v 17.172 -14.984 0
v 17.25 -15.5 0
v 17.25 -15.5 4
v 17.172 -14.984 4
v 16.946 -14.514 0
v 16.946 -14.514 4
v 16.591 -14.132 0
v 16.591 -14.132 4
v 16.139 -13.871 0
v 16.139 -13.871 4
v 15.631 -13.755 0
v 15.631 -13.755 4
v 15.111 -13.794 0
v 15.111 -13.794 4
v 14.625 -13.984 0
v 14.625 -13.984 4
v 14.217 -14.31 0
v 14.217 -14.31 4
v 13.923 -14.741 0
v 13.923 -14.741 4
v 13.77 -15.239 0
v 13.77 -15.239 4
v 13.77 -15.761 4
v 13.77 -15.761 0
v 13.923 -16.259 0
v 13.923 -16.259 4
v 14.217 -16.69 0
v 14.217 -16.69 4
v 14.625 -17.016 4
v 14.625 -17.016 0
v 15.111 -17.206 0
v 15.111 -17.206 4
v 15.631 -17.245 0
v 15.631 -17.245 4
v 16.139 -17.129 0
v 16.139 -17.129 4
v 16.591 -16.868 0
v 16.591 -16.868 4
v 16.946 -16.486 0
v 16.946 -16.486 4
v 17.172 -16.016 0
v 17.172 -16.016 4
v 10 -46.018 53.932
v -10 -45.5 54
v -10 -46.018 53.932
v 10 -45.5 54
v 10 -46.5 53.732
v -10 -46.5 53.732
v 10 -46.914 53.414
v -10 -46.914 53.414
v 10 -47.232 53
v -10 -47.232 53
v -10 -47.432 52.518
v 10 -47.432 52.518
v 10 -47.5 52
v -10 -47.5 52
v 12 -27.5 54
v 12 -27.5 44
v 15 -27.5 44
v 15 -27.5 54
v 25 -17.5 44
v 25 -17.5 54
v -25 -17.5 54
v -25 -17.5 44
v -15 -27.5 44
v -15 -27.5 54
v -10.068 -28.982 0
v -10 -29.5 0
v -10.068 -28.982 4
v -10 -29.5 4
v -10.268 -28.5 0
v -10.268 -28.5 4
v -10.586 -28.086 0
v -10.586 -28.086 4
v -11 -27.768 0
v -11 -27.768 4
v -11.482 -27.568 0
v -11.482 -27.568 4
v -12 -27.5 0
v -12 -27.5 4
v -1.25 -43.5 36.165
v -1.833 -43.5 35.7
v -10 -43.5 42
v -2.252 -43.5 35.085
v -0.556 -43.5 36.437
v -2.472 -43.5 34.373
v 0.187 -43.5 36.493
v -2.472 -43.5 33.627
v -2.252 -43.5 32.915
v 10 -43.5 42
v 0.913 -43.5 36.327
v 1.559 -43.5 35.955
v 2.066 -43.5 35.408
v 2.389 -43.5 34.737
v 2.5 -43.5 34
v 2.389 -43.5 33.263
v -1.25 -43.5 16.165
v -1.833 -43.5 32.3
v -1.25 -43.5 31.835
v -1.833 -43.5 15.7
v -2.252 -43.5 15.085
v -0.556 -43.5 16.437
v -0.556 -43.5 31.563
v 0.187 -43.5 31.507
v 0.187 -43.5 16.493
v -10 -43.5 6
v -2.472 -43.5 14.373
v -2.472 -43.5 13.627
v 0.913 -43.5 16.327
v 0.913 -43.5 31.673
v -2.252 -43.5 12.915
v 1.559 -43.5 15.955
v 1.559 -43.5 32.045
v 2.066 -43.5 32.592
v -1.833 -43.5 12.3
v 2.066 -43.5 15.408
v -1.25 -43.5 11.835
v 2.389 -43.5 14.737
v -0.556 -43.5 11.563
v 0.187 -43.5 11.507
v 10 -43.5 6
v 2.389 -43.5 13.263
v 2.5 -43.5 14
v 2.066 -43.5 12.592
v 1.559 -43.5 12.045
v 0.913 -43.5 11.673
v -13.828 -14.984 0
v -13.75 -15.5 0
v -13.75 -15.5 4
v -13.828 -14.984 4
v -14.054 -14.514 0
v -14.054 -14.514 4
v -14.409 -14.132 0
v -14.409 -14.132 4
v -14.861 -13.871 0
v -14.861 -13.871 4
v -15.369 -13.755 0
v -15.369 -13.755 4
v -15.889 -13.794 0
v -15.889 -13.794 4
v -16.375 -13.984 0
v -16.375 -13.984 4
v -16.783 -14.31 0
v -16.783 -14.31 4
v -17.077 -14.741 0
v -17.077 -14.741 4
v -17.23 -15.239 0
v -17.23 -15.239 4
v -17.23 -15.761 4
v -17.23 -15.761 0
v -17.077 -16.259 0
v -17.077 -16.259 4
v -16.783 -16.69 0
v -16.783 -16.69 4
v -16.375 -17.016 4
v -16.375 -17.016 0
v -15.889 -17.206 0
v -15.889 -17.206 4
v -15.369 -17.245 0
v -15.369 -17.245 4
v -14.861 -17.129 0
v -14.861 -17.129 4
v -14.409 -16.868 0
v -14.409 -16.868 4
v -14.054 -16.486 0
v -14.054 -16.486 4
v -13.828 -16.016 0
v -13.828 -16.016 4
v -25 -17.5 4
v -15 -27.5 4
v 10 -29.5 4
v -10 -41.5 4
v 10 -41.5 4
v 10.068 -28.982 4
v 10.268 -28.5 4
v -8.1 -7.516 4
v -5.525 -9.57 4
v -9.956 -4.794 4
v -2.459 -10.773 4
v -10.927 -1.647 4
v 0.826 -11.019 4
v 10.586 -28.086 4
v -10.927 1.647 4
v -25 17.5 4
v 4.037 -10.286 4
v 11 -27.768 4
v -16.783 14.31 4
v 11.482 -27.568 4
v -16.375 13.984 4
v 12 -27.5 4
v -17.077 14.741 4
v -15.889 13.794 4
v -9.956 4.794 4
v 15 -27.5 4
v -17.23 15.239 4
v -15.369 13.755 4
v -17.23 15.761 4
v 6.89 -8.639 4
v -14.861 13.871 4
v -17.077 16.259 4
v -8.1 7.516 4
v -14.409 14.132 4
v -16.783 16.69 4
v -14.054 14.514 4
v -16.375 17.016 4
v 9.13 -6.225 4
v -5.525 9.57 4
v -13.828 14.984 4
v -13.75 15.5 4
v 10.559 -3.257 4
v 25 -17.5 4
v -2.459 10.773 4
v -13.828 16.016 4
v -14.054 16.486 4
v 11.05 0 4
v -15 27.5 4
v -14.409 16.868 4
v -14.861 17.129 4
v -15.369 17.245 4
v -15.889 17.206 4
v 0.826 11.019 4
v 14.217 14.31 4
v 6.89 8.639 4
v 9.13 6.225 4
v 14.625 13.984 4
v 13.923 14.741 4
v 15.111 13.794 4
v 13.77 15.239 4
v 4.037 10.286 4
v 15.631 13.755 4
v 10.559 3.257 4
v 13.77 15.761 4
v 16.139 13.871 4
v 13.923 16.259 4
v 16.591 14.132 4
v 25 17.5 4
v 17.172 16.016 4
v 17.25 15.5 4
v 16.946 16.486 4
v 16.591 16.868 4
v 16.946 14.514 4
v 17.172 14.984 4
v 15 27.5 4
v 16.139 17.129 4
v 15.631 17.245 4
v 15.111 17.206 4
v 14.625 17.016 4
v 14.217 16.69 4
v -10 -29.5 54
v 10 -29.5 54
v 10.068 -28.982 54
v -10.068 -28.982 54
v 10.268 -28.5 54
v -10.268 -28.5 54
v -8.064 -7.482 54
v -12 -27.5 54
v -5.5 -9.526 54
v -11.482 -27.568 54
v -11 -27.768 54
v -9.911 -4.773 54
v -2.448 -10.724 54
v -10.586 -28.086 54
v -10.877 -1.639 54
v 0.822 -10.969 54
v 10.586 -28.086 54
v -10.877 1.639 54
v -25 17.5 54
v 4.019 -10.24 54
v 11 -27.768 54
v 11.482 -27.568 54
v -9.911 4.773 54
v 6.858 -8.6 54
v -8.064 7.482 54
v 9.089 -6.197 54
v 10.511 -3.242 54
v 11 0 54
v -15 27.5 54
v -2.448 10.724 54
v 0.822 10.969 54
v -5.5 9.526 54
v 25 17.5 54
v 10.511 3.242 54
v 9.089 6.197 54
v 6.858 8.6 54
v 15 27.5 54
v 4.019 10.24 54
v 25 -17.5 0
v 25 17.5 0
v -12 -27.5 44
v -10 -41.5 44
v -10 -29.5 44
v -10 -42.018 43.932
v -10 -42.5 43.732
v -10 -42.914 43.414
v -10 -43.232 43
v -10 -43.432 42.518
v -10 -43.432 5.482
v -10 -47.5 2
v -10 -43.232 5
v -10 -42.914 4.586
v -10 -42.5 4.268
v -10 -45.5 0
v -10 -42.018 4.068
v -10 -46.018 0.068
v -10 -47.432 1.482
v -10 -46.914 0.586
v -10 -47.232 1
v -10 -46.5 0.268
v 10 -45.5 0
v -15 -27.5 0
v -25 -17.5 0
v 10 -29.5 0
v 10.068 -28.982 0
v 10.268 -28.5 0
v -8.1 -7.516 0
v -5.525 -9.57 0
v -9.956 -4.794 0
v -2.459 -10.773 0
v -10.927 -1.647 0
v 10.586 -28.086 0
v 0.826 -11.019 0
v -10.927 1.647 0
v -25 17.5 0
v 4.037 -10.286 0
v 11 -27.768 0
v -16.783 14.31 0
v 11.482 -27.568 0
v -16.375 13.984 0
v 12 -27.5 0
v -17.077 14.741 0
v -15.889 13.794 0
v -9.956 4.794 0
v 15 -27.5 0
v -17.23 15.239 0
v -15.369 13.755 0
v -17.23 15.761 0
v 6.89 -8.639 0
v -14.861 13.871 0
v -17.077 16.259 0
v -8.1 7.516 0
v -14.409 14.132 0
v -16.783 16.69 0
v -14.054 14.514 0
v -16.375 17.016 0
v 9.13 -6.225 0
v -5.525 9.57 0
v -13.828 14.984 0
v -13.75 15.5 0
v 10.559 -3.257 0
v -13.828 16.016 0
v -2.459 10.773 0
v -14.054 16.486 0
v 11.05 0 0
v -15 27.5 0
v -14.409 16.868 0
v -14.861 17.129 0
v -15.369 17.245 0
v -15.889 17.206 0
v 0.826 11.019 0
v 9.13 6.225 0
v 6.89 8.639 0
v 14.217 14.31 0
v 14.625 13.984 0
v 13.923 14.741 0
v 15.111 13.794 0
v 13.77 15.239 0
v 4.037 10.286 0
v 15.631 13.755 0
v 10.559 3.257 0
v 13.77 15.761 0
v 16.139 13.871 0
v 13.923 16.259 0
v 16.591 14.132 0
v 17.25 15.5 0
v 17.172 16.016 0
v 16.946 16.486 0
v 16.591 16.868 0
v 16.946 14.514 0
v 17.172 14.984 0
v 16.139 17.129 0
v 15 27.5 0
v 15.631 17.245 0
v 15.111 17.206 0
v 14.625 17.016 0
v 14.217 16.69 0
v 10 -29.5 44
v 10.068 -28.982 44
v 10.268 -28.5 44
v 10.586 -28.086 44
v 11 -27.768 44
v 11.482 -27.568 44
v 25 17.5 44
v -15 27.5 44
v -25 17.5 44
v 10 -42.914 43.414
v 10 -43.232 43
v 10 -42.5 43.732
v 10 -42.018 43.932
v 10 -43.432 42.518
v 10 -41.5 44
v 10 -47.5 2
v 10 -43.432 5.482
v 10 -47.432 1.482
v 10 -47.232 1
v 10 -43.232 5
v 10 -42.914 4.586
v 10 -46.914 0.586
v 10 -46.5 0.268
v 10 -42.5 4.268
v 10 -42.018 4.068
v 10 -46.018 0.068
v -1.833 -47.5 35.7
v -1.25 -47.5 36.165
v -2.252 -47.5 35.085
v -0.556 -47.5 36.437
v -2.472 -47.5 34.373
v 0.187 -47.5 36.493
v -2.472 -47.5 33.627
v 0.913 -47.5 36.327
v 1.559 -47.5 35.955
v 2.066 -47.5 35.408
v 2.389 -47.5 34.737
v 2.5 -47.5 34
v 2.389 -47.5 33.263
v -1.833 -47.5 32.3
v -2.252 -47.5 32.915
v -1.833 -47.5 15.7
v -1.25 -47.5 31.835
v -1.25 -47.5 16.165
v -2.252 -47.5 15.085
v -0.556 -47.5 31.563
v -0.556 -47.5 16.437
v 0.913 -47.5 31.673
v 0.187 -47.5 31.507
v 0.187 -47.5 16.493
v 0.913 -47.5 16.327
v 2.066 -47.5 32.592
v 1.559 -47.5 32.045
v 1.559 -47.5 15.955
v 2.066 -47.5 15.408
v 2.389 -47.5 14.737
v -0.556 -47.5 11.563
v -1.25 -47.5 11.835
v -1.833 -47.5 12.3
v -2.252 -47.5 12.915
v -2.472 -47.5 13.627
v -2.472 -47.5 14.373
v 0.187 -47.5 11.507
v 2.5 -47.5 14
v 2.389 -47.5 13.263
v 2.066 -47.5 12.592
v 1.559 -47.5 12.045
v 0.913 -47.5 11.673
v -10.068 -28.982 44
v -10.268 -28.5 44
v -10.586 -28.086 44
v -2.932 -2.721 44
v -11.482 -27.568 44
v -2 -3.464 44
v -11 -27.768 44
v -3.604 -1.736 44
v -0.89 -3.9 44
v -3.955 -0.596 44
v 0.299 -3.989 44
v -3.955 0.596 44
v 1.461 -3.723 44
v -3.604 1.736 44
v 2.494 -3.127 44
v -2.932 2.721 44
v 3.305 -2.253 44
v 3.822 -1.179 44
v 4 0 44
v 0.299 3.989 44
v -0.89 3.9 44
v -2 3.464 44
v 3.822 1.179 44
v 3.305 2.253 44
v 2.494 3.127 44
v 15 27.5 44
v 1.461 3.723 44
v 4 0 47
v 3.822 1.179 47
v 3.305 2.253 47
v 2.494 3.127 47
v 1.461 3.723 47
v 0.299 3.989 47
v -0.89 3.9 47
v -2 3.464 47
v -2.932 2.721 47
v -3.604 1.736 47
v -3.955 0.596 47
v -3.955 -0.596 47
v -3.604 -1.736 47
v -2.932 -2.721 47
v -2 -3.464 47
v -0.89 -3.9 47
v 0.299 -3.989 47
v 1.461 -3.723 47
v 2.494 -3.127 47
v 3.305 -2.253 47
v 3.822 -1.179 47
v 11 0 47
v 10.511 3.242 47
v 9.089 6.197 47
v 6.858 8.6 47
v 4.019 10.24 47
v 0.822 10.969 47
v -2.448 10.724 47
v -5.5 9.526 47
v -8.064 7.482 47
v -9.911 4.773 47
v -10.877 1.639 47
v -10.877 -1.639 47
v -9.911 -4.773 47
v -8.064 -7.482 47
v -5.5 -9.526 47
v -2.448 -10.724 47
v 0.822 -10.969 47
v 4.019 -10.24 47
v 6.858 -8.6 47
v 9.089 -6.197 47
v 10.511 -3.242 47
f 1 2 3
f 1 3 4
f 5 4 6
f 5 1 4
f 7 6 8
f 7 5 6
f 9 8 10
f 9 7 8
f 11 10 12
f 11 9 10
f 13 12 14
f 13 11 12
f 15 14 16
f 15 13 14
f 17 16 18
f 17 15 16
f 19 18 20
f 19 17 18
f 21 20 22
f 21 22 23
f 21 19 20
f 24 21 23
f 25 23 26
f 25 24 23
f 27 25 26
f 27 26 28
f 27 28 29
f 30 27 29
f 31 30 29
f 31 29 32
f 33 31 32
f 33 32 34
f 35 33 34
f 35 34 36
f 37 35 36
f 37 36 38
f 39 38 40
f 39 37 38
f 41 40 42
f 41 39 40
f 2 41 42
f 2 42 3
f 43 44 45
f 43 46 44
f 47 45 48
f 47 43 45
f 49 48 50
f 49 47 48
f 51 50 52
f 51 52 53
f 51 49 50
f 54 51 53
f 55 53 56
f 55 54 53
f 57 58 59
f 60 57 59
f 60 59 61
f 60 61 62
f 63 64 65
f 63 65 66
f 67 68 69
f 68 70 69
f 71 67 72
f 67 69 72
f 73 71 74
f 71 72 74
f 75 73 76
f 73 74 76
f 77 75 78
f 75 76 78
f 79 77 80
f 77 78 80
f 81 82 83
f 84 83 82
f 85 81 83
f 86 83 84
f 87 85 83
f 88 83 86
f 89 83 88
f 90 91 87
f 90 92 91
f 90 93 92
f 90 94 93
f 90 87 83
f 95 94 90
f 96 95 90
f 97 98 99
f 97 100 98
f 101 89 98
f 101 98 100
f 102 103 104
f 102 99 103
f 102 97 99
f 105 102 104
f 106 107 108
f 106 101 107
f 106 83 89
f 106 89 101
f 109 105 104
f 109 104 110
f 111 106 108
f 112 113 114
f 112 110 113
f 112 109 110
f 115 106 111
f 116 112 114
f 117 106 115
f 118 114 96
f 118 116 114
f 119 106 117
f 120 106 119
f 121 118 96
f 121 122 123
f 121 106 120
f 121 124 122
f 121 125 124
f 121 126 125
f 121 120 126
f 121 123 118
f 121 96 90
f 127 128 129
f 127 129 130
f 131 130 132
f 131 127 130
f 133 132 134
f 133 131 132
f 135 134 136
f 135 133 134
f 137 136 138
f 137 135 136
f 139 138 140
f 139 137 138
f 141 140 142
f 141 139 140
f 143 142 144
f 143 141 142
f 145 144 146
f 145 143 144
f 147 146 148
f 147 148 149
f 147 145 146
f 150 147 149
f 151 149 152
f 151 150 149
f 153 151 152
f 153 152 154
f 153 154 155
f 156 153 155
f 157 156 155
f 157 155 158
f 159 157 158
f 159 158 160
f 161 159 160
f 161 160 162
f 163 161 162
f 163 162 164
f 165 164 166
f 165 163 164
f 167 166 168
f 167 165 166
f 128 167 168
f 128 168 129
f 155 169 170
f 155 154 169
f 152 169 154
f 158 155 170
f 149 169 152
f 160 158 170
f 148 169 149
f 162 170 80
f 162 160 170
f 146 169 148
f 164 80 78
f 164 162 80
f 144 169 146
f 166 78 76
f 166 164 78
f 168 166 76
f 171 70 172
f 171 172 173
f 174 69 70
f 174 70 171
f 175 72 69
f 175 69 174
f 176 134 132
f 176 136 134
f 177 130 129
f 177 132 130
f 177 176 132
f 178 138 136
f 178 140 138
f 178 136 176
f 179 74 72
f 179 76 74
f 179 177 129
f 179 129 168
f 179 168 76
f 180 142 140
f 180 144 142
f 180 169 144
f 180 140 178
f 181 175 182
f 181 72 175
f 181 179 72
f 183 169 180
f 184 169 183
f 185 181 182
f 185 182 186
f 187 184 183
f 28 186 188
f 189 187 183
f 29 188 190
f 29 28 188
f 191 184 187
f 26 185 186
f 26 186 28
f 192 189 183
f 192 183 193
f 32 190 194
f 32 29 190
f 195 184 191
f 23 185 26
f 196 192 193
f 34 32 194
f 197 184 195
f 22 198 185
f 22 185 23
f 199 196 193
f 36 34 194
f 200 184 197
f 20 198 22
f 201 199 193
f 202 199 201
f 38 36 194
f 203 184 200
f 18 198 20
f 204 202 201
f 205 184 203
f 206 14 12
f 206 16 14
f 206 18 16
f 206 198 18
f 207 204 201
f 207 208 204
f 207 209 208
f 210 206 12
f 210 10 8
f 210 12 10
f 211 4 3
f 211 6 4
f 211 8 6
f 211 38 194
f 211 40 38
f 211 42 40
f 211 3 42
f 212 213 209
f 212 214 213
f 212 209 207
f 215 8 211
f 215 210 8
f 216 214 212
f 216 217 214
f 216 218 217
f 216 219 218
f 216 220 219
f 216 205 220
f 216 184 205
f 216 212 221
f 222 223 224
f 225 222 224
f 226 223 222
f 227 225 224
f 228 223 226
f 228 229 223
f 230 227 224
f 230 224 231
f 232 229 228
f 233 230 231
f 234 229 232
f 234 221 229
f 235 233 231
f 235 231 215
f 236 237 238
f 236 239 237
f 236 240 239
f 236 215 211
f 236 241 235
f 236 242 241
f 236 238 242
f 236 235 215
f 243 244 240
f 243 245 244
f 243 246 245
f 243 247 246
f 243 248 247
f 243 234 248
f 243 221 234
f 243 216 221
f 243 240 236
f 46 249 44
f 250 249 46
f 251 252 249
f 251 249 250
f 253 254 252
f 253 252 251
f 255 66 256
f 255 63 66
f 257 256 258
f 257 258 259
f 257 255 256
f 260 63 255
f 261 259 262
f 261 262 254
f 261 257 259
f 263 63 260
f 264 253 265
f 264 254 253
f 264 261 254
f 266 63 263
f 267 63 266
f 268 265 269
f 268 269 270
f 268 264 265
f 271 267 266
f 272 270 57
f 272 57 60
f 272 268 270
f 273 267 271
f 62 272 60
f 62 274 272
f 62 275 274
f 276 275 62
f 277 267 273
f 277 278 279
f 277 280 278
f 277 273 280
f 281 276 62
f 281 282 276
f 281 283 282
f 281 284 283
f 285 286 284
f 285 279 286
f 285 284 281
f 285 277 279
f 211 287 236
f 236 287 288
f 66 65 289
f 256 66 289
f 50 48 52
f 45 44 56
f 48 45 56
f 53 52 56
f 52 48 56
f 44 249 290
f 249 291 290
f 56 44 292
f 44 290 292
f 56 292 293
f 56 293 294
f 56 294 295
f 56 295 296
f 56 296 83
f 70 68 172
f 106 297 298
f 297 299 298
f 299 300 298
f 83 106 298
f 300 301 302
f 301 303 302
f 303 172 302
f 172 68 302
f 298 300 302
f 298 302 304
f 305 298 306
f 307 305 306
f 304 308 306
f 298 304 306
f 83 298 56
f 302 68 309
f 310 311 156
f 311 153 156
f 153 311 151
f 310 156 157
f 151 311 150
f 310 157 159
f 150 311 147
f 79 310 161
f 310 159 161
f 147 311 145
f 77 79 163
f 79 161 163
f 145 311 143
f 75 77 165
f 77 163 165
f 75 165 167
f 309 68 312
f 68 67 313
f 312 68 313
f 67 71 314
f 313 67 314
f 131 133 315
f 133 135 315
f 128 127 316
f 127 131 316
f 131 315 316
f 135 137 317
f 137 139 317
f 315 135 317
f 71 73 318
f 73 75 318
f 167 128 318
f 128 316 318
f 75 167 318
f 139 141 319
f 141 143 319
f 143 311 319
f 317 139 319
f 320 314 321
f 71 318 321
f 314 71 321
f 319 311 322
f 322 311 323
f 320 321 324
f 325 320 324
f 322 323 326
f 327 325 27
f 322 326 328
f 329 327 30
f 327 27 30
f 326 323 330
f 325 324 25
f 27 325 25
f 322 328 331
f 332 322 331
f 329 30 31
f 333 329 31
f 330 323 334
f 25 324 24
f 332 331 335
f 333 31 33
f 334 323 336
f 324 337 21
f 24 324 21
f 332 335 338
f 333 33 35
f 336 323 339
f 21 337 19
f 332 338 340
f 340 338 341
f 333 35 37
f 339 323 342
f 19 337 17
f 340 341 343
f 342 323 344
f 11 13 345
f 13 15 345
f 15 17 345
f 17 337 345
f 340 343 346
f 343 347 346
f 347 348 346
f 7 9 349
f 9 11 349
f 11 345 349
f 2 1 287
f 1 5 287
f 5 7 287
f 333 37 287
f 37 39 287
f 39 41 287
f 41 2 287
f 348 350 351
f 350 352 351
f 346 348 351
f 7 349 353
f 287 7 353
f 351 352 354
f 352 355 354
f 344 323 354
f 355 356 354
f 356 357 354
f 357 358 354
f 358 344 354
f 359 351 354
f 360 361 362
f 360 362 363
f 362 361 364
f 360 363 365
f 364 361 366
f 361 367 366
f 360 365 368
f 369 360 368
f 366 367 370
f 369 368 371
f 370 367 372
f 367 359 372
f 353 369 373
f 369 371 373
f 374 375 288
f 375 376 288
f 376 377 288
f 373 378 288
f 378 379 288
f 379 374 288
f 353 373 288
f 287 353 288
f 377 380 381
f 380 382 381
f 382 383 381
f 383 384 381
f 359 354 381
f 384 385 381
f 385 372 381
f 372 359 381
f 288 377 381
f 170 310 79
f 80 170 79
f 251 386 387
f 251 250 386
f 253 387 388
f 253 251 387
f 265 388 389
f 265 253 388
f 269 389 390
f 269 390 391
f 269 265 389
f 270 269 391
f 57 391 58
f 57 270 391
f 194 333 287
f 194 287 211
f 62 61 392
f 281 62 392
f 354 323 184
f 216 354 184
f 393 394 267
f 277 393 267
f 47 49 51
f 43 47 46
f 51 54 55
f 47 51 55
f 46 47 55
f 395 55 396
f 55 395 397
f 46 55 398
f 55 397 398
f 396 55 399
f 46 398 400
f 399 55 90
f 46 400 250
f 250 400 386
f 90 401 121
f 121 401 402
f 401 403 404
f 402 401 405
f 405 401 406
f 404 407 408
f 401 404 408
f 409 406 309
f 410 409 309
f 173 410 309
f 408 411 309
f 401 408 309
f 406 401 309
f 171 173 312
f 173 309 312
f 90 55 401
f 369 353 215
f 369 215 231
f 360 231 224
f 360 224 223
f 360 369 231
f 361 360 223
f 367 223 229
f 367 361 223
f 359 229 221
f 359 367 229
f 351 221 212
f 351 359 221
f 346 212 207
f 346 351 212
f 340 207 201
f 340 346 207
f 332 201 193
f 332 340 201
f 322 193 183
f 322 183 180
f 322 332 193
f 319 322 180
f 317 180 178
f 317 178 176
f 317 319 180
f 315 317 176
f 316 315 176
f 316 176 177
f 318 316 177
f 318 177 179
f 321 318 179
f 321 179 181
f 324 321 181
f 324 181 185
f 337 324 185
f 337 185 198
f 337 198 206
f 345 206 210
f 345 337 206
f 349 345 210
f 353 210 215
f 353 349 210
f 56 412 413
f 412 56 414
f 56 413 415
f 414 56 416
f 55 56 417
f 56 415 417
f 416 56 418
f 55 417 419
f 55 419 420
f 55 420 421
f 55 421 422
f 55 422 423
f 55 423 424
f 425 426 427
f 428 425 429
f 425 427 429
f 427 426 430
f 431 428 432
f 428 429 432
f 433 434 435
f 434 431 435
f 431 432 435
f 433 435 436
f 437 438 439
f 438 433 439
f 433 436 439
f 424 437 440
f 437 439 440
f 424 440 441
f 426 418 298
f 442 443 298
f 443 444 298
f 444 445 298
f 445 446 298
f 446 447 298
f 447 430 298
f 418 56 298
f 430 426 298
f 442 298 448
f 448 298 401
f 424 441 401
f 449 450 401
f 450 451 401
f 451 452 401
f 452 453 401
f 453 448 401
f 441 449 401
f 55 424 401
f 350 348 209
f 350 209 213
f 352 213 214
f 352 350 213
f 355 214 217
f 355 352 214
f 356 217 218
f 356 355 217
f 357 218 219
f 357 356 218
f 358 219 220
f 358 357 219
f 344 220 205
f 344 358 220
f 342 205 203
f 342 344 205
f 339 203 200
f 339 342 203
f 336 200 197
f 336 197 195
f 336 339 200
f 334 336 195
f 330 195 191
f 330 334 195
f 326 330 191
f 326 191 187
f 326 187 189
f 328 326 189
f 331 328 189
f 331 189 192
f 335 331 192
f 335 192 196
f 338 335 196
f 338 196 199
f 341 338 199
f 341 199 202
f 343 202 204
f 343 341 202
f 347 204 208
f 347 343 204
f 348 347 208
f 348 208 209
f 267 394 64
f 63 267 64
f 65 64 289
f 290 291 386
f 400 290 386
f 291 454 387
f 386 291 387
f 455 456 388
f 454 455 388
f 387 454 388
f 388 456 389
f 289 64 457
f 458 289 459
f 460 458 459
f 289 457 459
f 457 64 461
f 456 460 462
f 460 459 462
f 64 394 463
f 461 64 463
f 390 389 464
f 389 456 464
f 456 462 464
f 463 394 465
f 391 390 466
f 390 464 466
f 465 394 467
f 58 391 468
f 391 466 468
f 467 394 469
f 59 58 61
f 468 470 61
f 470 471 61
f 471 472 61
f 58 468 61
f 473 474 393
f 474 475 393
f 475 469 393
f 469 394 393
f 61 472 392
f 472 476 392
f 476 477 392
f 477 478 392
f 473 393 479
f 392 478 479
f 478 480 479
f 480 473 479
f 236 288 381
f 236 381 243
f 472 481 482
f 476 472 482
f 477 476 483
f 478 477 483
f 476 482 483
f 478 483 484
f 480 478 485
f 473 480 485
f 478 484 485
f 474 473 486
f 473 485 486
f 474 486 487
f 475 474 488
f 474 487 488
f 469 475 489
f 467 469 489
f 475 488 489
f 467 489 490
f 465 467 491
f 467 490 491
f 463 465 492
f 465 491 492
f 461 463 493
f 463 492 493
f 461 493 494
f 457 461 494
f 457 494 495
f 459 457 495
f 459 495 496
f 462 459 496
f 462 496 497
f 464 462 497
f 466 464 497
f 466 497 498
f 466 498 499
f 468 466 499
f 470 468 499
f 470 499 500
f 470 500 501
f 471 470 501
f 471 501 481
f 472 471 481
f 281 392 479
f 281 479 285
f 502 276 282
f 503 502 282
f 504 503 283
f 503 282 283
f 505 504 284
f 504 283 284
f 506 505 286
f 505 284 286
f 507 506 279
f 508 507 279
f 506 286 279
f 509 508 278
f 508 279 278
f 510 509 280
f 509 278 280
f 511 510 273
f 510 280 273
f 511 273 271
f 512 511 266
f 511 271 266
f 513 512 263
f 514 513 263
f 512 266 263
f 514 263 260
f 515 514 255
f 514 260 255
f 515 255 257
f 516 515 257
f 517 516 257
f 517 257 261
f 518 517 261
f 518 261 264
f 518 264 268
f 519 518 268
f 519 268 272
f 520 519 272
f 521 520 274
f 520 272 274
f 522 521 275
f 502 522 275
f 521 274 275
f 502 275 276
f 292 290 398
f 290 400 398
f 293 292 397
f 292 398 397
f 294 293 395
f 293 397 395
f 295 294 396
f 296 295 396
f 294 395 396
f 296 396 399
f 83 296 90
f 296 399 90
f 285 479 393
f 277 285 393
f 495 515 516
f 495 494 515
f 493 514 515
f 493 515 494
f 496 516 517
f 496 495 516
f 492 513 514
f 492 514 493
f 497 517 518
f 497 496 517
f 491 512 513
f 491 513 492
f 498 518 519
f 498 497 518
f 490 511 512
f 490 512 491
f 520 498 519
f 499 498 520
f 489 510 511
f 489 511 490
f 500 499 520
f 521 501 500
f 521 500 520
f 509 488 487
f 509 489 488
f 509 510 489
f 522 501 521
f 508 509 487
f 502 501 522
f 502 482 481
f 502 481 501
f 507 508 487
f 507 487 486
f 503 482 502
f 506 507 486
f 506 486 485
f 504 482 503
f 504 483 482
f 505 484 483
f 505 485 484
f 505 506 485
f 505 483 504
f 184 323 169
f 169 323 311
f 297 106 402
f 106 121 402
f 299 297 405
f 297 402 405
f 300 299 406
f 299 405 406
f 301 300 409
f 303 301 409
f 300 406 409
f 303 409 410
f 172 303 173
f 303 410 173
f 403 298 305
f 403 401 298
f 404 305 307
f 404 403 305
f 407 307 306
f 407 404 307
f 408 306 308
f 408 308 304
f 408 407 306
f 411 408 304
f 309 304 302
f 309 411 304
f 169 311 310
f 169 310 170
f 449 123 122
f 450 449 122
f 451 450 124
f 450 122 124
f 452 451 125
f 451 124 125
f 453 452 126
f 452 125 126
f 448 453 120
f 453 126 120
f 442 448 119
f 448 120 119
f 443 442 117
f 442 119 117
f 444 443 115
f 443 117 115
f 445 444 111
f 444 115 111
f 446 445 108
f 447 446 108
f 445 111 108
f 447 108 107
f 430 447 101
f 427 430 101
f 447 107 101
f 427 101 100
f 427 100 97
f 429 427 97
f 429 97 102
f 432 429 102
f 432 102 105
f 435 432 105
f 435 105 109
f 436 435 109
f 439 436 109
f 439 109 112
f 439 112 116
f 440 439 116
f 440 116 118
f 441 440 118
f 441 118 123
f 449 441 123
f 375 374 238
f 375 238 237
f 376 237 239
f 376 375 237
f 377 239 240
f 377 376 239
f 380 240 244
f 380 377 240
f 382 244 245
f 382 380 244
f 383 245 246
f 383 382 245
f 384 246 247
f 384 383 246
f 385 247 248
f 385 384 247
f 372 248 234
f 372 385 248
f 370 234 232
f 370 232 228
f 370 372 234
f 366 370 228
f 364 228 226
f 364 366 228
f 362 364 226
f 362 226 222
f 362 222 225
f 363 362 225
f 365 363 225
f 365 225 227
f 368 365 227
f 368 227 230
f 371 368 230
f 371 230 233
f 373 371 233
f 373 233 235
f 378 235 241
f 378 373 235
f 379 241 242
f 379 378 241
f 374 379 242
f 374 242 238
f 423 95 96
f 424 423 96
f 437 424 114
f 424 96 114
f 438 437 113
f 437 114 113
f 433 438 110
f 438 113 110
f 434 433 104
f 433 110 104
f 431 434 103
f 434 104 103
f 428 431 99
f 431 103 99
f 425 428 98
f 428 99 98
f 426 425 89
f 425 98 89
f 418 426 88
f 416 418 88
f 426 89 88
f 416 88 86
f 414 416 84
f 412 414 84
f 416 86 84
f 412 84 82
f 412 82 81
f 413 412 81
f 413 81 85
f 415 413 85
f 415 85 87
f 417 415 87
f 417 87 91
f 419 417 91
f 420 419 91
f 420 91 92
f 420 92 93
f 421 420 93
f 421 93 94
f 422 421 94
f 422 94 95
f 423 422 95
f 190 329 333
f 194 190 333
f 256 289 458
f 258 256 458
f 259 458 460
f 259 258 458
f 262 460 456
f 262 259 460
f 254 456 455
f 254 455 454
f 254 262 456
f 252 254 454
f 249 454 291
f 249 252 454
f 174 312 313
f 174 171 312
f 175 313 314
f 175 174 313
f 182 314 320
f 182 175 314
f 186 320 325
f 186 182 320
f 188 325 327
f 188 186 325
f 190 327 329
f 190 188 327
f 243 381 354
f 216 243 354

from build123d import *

# Parameters (mm, degrees)
SCHIZZO1_R                   = 1.75
SCHIZZO1_R_2                 = 11.05
ESTRUSIONE_ESTRUSIONE1_DEPTH = 4
SCHIZZO14_W                  = 20
SCHIZZO14_H                  = 4
ESTRUSIONE_ESTRUSIONE2_DEPTH = 40
ESTRUSIONE_ESTRUSIONE3_DEPTH = 10
SCHIZZO19_R                  = 11
TAGLIO_ESTRUSIONE1_DEPTH     = 7
SCHIZZO20_R                  = 4
TAGLIO_ESTRUSIONE2_DEPTH     = 7
SMUSSO1_SIZE                 = 10
RACCORDO1_R                  = 2
SCHIZZO21_R                  = 2.5
TAGLIO_ESTRUSIONE3_DEPTH     = 10


with BuildPart() as part:
    # Schizzo1 → Estrusione-Estrusione1 (new body)
    with BuildSketch(Plane.XY):
        Polygon((-25, -27.5), (-10, -27.5), (-10, -47.5), (10, -47.5), (10, -27.5), (25, -27.5), (25, 27.5), (-25, 27.5), align=None)
        with Locations((-15.5, 15.5)):
            Circle(SCHIZZO1_R, mode=Mode.SUBTRACT)
        with Locations((15.5, 15.5)):
            Circle(SCHIZZO1_R, mode=Mode.SUBTRACT)
        with Locations((15.5, -15.5)):
            Circle(SCHIZZO1_R, mode=Mode.SUBTRACT)
        with Locations((-15.5, -15.5)):
            Circle(SCHIZZO1_R, mode=Mode.SUBTRACT)
        Circle(SCHIZZO1_R_2, mode=Mode.SUBTRACT)
    extrude(amount=ESTRUSIONE_ESTRUSIONE1_DEPTH)

    # Schizzo14 → Estrusione-Estrusione2 (add)
    with BuildSketch(Plane.XY.offset(4)):
        with Locations((0, -45.5)):
            Rectangle(SCHIZZO14_W, SCHIZZO14_H)
    extrude(amount=ESTRUSIONE_ESTRUSIONE2_DEPTH)

    # Schizzo18 → Estrusione-Estrusione3 (add)
    with BuildSketch(Plane.XY.offset(44)):
        Polygon((-25, -27.5), (-10, -27.5), (-10, -47.5), (10, -47.5), (10, -27.5), (25, -27.5), (25, 27.5), (-25, 27.5), align=None)
    extrude(amount=ESTRUSIONE_ESTRUSIONE3_DEPTH)

    # Schizzo19 → Taglio-Estrusione1 (cut)
    with BuildSketch(Plane.XY.offset(54)):
        Circle(SCHIZZO19_R)
    extrude(amount=-TAGLIO_ESTRUSIONE1_DEPTH, mode=Mode.SUBTRACT)

    # Schizzo20 → Taglio-Estrusione2 (cut)
    with BuildSketch(Plane.XY.offset(47)):
        Circle(SCHIZZO20_R)
    extrude(amount=-TAGLIO_ESTRUSIONE2_DEPTH, mode=Mode.SUBTRACT)

    # Smusso1
    smusso1_edges = [part.edges().sort_by_distance(p)[0] for p in [
        (25, -27.5, 2),
        (-25, -27.5, 2),
        (-25, 27.5, 2),
        (25, 27.5, 2),
        (25, -27.5, 49),
        (25, 27.5, 49),
        (-25, 27.5, 49),
        (-25, -27.5, 49),
    ]]
    chamfer(smusso1_edges, length=SMUSSO1_SIZE)

    # Raccordo1
    raccordo1_edges = [part.edges().sort_by_distance(p)[0] for p in [
        (10, -27.5, 2),
        (-10, -27.5, 2),
        (0, -43.5, 4),
        (0, -43.5, 44),
        (-10, -27.5, 49),
        (10, -27.5, 49),
        (0, -47.5, 54),
        (0, -47.5, 0),
    ]]
    fillet(raccordo1_edges, radius=RACCORDO1_R)

    # Schizzo21 → Taglio-Estrusione3 (cut)
    with BuildSketch(Plane(origin=(0, -43.5, 0), x_dir=(1, 0, 0), z_dir=(0, 1, 0))):
        with Locations((0, -14)):
            Circle(SCHIZZO21_R)
        with Locations((0, -34)):
            Circle(SCHIZZO21_R)
    extrude(amount=-TAGLIO_ESTRUSIONE3_DEPTH, mode=Mode.SUBTRACT)


solid = part.part
